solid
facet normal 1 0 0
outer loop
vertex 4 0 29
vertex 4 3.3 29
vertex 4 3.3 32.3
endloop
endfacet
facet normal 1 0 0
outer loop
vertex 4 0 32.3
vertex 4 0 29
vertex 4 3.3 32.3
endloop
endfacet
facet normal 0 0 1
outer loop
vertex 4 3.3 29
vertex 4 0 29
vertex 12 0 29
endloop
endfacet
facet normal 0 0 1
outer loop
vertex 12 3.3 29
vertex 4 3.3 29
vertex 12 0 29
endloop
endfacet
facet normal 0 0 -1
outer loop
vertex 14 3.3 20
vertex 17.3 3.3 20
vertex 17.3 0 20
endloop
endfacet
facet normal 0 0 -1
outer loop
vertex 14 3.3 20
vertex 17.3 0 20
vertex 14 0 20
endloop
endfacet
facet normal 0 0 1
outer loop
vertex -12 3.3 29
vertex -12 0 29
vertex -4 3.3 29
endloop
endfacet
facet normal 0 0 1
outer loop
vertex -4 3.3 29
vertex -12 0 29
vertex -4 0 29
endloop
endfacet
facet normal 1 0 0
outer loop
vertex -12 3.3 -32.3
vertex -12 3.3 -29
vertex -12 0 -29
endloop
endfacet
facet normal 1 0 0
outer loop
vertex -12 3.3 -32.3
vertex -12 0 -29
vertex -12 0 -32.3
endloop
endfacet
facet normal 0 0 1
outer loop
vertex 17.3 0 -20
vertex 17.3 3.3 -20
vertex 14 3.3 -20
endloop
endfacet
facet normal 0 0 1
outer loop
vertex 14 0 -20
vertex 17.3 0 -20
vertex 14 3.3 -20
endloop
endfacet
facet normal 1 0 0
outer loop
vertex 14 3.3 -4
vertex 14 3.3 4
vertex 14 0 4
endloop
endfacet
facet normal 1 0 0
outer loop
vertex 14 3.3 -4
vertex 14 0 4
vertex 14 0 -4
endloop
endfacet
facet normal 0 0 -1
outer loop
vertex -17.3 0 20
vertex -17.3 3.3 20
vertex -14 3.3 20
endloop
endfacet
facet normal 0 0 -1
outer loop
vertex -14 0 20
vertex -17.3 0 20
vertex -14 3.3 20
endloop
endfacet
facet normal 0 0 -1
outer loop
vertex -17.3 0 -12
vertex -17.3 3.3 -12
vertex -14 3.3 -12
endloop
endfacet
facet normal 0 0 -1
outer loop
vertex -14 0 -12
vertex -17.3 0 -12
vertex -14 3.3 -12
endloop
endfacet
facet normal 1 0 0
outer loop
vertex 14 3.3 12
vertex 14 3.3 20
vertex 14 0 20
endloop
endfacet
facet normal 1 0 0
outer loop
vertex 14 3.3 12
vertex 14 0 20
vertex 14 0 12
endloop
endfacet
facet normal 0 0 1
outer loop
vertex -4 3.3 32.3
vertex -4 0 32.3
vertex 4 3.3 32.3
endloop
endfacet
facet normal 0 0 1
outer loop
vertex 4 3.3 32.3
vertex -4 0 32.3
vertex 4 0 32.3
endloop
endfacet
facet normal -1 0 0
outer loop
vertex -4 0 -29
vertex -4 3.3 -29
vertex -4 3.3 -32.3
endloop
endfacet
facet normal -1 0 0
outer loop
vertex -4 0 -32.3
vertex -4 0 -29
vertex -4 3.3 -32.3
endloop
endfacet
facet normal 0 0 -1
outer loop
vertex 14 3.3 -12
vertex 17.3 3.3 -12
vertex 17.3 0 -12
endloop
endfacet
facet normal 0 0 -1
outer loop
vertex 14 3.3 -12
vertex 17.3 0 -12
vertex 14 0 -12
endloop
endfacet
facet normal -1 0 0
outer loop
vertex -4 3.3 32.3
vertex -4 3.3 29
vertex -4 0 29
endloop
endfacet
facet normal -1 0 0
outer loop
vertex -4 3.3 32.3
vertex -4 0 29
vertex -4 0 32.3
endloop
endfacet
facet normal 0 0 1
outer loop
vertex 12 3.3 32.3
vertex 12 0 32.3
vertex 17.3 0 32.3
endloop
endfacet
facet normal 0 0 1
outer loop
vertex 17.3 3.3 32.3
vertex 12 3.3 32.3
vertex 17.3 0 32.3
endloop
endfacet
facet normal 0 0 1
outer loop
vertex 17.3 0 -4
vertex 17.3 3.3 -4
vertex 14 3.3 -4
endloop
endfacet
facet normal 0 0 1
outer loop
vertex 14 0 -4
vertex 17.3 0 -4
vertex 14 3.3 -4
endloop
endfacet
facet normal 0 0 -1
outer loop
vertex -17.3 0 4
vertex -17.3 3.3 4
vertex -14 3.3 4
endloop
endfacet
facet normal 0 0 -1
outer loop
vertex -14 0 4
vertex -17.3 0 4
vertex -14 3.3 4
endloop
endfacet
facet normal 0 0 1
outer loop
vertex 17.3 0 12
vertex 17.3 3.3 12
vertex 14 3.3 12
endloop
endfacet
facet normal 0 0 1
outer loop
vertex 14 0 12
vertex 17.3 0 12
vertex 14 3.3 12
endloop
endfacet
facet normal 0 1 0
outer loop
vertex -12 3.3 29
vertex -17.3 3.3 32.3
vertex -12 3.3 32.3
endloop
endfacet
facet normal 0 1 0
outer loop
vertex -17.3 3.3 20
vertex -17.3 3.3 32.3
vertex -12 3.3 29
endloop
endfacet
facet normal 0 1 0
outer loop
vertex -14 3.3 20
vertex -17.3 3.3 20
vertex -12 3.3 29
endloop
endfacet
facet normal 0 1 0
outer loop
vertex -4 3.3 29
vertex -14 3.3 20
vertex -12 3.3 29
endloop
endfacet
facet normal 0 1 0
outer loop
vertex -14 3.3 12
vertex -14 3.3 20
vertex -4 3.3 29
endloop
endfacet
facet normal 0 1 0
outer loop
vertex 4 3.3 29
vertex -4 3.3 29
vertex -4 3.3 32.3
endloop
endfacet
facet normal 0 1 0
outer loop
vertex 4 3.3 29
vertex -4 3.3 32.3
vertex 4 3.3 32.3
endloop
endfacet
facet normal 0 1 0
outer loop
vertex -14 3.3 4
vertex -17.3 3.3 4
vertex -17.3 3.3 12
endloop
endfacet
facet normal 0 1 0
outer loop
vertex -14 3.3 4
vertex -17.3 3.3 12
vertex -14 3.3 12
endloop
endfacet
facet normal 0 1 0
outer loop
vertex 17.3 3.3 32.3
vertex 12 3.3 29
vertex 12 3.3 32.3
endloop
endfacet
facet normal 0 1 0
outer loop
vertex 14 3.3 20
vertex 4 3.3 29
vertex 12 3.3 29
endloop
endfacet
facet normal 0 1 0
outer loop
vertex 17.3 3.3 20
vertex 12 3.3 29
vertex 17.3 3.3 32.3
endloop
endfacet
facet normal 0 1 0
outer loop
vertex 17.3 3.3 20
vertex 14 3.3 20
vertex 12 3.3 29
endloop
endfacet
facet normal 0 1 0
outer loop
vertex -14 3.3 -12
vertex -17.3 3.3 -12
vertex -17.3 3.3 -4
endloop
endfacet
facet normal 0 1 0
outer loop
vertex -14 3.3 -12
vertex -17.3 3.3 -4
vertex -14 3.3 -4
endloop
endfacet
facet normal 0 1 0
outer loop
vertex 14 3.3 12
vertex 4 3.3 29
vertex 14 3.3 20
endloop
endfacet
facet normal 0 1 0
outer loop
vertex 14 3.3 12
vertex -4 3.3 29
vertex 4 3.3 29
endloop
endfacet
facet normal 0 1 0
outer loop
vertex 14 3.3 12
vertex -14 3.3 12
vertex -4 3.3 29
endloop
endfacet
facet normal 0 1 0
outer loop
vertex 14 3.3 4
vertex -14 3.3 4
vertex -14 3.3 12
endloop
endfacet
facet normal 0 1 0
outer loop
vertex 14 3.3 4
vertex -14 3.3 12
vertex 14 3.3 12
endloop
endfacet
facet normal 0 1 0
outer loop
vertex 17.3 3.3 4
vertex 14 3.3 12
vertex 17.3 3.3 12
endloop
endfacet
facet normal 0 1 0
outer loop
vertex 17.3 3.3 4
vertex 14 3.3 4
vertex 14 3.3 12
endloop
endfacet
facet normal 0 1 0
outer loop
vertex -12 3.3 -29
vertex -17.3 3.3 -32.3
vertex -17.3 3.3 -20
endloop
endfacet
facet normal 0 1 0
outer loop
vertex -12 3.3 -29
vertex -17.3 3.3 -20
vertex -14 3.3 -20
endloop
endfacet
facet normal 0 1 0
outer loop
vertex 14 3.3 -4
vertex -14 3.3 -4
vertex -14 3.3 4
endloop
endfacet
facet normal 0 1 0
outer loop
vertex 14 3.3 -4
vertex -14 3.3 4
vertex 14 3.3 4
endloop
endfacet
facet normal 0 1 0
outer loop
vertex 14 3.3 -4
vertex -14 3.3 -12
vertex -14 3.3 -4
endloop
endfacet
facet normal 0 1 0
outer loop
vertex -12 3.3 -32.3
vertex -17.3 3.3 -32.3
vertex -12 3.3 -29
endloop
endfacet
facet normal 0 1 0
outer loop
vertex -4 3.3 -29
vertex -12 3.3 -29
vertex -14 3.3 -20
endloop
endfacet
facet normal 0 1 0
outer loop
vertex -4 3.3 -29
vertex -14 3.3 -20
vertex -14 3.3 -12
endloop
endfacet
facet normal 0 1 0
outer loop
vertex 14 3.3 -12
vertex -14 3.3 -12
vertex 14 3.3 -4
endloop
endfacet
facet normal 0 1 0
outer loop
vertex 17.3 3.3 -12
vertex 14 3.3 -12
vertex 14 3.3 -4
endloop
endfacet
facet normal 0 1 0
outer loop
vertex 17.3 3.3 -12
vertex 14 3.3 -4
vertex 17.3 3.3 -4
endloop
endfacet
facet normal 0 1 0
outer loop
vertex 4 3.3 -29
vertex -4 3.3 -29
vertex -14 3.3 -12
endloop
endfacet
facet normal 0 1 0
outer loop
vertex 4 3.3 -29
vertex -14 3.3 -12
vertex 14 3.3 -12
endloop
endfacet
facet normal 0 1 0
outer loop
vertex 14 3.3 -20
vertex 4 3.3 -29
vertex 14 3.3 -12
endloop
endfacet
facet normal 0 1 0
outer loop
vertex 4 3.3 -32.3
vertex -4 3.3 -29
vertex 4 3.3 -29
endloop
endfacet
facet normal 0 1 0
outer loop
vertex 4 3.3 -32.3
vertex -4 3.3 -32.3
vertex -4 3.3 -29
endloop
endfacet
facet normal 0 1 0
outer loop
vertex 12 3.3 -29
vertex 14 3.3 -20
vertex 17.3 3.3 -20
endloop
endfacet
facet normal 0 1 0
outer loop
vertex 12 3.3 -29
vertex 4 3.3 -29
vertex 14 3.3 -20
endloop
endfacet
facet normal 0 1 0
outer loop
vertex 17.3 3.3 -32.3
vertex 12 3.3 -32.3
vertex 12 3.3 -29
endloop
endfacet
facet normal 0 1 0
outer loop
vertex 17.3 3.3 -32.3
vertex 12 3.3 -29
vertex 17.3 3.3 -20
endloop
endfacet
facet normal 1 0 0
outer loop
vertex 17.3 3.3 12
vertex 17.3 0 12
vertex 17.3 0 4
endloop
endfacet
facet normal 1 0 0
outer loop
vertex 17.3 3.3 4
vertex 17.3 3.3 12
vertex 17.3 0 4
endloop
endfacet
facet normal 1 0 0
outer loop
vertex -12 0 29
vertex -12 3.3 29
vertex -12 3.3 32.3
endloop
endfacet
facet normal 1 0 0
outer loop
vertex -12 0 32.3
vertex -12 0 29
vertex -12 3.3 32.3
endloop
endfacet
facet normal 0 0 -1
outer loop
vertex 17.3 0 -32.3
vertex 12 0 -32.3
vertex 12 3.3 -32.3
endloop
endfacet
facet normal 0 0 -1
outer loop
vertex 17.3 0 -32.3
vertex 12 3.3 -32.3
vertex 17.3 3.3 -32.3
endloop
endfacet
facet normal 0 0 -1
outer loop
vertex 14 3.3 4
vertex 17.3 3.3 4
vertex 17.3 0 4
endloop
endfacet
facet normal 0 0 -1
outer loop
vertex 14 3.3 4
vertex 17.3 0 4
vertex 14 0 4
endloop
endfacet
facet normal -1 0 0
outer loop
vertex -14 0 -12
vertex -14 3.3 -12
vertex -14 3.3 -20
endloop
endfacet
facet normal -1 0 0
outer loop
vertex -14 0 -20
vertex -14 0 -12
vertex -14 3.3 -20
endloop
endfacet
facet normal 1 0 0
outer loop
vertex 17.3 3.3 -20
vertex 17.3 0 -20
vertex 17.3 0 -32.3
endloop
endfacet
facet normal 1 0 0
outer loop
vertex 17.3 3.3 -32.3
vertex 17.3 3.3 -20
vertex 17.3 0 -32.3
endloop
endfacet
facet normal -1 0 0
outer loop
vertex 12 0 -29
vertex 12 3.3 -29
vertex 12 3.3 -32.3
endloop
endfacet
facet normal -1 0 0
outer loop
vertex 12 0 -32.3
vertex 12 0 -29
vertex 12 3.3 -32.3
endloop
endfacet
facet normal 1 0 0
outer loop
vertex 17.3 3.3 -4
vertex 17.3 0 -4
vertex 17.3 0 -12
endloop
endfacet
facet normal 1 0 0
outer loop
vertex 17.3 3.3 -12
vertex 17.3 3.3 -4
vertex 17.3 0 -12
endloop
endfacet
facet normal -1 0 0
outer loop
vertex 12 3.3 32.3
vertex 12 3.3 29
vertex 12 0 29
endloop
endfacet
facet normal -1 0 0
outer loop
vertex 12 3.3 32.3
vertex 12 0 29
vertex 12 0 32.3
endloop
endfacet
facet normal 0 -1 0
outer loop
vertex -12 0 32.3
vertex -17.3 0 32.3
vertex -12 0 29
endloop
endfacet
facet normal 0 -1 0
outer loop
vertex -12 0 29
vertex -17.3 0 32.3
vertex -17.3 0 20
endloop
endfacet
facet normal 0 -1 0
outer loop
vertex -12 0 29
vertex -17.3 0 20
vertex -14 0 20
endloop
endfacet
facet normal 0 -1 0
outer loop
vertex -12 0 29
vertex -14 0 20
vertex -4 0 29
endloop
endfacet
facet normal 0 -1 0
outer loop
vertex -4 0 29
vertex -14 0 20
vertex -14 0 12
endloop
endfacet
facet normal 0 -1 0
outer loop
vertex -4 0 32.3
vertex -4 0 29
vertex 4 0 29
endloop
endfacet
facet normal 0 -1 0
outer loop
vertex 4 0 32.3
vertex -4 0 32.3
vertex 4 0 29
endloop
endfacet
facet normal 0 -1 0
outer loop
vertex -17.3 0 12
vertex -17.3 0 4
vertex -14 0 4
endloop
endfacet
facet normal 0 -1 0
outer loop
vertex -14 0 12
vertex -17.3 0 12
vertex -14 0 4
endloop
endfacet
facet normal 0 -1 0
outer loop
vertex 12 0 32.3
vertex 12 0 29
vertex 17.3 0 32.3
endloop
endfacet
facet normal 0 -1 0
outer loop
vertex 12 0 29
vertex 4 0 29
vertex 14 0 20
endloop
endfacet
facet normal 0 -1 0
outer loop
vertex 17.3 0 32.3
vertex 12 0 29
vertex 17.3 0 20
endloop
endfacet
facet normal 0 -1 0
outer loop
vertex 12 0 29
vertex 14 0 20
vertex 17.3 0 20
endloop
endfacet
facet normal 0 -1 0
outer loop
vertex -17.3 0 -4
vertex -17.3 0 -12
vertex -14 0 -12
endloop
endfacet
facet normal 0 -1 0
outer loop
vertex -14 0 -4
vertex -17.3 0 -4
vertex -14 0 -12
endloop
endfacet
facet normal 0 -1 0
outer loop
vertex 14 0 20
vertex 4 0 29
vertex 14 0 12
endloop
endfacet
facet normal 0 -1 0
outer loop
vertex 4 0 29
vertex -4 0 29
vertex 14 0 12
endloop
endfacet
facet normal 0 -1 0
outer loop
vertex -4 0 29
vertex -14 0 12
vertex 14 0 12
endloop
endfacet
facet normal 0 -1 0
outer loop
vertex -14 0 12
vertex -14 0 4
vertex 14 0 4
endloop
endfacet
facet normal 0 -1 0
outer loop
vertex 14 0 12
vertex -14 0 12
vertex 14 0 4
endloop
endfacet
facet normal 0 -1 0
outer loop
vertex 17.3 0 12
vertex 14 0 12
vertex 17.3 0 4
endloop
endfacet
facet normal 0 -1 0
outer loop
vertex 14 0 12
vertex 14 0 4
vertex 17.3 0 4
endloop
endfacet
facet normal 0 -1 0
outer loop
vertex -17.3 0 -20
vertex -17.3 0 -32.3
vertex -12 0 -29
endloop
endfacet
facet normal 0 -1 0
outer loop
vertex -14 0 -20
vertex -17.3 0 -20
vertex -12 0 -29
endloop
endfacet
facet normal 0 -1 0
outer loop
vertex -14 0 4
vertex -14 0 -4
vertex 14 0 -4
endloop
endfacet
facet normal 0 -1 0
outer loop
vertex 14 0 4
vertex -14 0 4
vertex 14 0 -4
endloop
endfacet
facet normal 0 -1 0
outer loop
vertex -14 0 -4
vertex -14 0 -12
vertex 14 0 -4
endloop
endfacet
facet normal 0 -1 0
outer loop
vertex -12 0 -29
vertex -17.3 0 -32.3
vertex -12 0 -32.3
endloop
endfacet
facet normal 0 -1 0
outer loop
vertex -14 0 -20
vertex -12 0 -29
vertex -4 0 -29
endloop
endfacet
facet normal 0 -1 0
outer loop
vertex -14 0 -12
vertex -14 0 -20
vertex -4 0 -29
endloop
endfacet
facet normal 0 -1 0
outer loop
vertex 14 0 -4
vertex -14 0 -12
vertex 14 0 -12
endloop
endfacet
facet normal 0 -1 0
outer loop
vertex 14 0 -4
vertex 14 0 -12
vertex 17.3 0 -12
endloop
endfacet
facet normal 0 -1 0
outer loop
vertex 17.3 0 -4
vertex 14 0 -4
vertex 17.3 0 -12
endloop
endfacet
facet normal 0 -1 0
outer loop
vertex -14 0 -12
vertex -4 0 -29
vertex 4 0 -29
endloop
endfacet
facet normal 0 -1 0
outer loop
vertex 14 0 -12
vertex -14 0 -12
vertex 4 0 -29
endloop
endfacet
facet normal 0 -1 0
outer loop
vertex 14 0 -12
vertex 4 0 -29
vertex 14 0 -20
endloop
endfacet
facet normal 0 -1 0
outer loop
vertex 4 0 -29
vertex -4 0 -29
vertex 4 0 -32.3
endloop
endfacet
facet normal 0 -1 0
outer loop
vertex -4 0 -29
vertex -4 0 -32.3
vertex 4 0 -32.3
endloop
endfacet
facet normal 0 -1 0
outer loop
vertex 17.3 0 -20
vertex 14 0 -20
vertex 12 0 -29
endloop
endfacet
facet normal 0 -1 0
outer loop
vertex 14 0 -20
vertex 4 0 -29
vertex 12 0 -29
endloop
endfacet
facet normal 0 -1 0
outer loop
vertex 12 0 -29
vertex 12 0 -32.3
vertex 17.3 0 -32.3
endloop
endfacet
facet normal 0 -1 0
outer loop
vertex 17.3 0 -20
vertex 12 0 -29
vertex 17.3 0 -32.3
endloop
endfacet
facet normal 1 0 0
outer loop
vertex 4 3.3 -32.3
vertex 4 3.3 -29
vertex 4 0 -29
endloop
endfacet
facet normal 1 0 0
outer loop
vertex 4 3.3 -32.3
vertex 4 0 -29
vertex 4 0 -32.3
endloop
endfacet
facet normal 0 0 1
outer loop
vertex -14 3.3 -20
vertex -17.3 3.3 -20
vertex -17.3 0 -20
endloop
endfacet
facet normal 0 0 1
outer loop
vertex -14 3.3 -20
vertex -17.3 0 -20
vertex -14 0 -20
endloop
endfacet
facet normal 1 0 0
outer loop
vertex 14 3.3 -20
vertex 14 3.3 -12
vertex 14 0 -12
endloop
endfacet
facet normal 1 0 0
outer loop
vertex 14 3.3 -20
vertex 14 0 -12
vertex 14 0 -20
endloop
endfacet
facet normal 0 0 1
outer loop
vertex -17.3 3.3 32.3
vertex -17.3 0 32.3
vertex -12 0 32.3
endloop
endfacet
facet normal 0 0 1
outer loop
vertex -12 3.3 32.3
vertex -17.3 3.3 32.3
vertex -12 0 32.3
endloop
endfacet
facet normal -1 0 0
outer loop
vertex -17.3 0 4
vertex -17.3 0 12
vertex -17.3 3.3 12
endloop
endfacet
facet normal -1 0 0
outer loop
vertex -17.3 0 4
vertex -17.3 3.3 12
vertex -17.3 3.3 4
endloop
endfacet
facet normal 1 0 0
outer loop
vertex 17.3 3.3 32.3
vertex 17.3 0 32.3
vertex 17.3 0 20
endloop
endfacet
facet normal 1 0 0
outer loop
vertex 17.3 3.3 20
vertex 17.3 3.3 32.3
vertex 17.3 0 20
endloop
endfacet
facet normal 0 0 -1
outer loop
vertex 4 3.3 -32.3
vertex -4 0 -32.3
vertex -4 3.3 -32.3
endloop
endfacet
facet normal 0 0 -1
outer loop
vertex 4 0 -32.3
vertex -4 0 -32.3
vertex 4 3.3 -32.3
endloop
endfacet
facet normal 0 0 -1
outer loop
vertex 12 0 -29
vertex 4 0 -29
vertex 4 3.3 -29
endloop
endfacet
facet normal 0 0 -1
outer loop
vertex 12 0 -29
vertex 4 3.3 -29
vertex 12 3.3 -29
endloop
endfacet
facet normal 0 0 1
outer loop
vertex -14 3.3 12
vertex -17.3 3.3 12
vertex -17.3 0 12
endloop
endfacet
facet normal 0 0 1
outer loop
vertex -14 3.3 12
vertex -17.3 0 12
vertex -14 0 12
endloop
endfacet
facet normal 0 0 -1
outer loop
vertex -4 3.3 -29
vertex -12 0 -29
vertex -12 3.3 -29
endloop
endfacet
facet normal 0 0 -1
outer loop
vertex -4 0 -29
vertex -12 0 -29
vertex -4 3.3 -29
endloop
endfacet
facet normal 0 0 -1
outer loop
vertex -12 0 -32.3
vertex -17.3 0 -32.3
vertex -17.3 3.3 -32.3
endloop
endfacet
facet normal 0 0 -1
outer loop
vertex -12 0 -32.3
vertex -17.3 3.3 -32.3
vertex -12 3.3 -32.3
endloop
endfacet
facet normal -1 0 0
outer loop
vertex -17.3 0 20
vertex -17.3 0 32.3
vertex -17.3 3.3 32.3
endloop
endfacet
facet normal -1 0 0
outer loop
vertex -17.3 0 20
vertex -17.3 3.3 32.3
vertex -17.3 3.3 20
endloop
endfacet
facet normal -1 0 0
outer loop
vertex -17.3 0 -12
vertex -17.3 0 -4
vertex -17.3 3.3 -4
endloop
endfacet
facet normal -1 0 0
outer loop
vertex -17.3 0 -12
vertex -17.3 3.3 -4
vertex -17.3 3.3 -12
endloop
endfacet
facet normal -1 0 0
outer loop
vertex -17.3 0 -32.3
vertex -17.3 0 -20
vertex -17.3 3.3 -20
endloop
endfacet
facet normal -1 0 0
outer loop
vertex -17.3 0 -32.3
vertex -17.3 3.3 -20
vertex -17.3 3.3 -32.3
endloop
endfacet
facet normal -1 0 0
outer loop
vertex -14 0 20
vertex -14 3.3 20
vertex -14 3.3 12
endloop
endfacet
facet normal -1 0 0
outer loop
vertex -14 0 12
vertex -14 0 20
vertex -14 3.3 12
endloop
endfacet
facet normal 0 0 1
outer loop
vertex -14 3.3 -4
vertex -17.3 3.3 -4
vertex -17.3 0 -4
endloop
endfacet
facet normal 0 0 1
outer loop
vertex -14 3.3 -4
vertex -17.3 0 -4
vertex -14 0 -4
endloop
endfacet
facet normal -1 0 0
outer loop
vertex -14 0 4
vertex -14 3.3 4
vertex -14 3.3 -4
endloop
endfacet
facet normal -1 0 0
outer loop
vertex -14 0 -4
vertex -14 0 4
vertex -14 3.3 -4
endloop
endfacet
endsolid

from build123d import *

# Parameters (mm, degrees)
ESQUISSE1_W             = 34.6
ESQUISSE1_H             = 64.6
BOSS_EXTRU_1_DEPTH      = 3.3
ENL_V_START             = -4.3
ESQUISSE2_W             = 8
ESQUISSE2_H             = 3.3
ENL_V_MAT_EXTRU_1_DEPTH = 5.3
ESQUISSE3_W             = 3.3
ESQUISSE3_H             = 8
ENL_V_MAT_EXTRU_2_DEPTH = 3.3


with BuildPart() as part:
    # Esquisse1 → Boss.-Extru.1 (new body)
    with BuildSketch(Plane(origin=(0, 0, 0), x_dir=(1, 0, 0), z_dir=(0, 1, 0))):
        Rectangle(ESQUISSE1_W, ESQUISSE1_H)
    extrude(amount=BOSS_EXTRU_1_DEPTH)

    # Esquisse2 → Enlèv. mat.-Extru.1 (cut)
    with BuildSketch(Plane(origin=(0, 3.3, 0), x_dir=(1, 0, 0), z_dir=(0, 1, 0)).offset(ENL_V_START)):
        with Locations((-8, 30.65)):
            Rectangle(ESQUISSE2_W, ESQUISSE2_H)
        with Locations((8, 30.65)):
            Rectangle(ESQUISSE2_W, ESQUISSE2_H)
    enl_v_mat_extru_1 = extrude(amount=ENL_V_MAT_EXTRU_1_DEPTH, mode=Mode.SUBTRACT)

    # Symétrie1: Enlèv. mat.-Extru.1 across plane
    add(enl_v_mat_extru_1.mirror(Plane.XY), mode=Mode.SUBTRACT)

    # Esquisse3 → Enlèv. mat.-Extru.2 (cut)
    with BuildSketch(Plane(origin=(0, 3.3, 0), x_dir=(1, 0, 0), z_dir=(0, 1, 0))):
        with Locations((-15.65, 0)):
            Rectangle(ESQUISSE3_W, ESQUISSE3_H)
        with Locations((-15.65, 16)):
            Rectangle(ESQUISSE3_W, ESQUISSE3_H)
        with Locations((-15.65, -16)):
            Rectangle(ESQUISSE3_W, ESQUISSE3_H)
    enl_v_mat_extru_2 = extrude(amount=-ENL_V_MAT_EXTRU_2_DEPTH, mode=Mode.SUBTRACT)

    # Symétrie2: Enlèv. mat.-Extru.2 across plane
    add(enl_v_mat_extru_2.mirror(Plane(origin=(0, 0, 0), x_dir=(0, 0, 1), z_dir=(1, 0, 0))), mode=Mode.SUBTRACT)


solid = part.part
